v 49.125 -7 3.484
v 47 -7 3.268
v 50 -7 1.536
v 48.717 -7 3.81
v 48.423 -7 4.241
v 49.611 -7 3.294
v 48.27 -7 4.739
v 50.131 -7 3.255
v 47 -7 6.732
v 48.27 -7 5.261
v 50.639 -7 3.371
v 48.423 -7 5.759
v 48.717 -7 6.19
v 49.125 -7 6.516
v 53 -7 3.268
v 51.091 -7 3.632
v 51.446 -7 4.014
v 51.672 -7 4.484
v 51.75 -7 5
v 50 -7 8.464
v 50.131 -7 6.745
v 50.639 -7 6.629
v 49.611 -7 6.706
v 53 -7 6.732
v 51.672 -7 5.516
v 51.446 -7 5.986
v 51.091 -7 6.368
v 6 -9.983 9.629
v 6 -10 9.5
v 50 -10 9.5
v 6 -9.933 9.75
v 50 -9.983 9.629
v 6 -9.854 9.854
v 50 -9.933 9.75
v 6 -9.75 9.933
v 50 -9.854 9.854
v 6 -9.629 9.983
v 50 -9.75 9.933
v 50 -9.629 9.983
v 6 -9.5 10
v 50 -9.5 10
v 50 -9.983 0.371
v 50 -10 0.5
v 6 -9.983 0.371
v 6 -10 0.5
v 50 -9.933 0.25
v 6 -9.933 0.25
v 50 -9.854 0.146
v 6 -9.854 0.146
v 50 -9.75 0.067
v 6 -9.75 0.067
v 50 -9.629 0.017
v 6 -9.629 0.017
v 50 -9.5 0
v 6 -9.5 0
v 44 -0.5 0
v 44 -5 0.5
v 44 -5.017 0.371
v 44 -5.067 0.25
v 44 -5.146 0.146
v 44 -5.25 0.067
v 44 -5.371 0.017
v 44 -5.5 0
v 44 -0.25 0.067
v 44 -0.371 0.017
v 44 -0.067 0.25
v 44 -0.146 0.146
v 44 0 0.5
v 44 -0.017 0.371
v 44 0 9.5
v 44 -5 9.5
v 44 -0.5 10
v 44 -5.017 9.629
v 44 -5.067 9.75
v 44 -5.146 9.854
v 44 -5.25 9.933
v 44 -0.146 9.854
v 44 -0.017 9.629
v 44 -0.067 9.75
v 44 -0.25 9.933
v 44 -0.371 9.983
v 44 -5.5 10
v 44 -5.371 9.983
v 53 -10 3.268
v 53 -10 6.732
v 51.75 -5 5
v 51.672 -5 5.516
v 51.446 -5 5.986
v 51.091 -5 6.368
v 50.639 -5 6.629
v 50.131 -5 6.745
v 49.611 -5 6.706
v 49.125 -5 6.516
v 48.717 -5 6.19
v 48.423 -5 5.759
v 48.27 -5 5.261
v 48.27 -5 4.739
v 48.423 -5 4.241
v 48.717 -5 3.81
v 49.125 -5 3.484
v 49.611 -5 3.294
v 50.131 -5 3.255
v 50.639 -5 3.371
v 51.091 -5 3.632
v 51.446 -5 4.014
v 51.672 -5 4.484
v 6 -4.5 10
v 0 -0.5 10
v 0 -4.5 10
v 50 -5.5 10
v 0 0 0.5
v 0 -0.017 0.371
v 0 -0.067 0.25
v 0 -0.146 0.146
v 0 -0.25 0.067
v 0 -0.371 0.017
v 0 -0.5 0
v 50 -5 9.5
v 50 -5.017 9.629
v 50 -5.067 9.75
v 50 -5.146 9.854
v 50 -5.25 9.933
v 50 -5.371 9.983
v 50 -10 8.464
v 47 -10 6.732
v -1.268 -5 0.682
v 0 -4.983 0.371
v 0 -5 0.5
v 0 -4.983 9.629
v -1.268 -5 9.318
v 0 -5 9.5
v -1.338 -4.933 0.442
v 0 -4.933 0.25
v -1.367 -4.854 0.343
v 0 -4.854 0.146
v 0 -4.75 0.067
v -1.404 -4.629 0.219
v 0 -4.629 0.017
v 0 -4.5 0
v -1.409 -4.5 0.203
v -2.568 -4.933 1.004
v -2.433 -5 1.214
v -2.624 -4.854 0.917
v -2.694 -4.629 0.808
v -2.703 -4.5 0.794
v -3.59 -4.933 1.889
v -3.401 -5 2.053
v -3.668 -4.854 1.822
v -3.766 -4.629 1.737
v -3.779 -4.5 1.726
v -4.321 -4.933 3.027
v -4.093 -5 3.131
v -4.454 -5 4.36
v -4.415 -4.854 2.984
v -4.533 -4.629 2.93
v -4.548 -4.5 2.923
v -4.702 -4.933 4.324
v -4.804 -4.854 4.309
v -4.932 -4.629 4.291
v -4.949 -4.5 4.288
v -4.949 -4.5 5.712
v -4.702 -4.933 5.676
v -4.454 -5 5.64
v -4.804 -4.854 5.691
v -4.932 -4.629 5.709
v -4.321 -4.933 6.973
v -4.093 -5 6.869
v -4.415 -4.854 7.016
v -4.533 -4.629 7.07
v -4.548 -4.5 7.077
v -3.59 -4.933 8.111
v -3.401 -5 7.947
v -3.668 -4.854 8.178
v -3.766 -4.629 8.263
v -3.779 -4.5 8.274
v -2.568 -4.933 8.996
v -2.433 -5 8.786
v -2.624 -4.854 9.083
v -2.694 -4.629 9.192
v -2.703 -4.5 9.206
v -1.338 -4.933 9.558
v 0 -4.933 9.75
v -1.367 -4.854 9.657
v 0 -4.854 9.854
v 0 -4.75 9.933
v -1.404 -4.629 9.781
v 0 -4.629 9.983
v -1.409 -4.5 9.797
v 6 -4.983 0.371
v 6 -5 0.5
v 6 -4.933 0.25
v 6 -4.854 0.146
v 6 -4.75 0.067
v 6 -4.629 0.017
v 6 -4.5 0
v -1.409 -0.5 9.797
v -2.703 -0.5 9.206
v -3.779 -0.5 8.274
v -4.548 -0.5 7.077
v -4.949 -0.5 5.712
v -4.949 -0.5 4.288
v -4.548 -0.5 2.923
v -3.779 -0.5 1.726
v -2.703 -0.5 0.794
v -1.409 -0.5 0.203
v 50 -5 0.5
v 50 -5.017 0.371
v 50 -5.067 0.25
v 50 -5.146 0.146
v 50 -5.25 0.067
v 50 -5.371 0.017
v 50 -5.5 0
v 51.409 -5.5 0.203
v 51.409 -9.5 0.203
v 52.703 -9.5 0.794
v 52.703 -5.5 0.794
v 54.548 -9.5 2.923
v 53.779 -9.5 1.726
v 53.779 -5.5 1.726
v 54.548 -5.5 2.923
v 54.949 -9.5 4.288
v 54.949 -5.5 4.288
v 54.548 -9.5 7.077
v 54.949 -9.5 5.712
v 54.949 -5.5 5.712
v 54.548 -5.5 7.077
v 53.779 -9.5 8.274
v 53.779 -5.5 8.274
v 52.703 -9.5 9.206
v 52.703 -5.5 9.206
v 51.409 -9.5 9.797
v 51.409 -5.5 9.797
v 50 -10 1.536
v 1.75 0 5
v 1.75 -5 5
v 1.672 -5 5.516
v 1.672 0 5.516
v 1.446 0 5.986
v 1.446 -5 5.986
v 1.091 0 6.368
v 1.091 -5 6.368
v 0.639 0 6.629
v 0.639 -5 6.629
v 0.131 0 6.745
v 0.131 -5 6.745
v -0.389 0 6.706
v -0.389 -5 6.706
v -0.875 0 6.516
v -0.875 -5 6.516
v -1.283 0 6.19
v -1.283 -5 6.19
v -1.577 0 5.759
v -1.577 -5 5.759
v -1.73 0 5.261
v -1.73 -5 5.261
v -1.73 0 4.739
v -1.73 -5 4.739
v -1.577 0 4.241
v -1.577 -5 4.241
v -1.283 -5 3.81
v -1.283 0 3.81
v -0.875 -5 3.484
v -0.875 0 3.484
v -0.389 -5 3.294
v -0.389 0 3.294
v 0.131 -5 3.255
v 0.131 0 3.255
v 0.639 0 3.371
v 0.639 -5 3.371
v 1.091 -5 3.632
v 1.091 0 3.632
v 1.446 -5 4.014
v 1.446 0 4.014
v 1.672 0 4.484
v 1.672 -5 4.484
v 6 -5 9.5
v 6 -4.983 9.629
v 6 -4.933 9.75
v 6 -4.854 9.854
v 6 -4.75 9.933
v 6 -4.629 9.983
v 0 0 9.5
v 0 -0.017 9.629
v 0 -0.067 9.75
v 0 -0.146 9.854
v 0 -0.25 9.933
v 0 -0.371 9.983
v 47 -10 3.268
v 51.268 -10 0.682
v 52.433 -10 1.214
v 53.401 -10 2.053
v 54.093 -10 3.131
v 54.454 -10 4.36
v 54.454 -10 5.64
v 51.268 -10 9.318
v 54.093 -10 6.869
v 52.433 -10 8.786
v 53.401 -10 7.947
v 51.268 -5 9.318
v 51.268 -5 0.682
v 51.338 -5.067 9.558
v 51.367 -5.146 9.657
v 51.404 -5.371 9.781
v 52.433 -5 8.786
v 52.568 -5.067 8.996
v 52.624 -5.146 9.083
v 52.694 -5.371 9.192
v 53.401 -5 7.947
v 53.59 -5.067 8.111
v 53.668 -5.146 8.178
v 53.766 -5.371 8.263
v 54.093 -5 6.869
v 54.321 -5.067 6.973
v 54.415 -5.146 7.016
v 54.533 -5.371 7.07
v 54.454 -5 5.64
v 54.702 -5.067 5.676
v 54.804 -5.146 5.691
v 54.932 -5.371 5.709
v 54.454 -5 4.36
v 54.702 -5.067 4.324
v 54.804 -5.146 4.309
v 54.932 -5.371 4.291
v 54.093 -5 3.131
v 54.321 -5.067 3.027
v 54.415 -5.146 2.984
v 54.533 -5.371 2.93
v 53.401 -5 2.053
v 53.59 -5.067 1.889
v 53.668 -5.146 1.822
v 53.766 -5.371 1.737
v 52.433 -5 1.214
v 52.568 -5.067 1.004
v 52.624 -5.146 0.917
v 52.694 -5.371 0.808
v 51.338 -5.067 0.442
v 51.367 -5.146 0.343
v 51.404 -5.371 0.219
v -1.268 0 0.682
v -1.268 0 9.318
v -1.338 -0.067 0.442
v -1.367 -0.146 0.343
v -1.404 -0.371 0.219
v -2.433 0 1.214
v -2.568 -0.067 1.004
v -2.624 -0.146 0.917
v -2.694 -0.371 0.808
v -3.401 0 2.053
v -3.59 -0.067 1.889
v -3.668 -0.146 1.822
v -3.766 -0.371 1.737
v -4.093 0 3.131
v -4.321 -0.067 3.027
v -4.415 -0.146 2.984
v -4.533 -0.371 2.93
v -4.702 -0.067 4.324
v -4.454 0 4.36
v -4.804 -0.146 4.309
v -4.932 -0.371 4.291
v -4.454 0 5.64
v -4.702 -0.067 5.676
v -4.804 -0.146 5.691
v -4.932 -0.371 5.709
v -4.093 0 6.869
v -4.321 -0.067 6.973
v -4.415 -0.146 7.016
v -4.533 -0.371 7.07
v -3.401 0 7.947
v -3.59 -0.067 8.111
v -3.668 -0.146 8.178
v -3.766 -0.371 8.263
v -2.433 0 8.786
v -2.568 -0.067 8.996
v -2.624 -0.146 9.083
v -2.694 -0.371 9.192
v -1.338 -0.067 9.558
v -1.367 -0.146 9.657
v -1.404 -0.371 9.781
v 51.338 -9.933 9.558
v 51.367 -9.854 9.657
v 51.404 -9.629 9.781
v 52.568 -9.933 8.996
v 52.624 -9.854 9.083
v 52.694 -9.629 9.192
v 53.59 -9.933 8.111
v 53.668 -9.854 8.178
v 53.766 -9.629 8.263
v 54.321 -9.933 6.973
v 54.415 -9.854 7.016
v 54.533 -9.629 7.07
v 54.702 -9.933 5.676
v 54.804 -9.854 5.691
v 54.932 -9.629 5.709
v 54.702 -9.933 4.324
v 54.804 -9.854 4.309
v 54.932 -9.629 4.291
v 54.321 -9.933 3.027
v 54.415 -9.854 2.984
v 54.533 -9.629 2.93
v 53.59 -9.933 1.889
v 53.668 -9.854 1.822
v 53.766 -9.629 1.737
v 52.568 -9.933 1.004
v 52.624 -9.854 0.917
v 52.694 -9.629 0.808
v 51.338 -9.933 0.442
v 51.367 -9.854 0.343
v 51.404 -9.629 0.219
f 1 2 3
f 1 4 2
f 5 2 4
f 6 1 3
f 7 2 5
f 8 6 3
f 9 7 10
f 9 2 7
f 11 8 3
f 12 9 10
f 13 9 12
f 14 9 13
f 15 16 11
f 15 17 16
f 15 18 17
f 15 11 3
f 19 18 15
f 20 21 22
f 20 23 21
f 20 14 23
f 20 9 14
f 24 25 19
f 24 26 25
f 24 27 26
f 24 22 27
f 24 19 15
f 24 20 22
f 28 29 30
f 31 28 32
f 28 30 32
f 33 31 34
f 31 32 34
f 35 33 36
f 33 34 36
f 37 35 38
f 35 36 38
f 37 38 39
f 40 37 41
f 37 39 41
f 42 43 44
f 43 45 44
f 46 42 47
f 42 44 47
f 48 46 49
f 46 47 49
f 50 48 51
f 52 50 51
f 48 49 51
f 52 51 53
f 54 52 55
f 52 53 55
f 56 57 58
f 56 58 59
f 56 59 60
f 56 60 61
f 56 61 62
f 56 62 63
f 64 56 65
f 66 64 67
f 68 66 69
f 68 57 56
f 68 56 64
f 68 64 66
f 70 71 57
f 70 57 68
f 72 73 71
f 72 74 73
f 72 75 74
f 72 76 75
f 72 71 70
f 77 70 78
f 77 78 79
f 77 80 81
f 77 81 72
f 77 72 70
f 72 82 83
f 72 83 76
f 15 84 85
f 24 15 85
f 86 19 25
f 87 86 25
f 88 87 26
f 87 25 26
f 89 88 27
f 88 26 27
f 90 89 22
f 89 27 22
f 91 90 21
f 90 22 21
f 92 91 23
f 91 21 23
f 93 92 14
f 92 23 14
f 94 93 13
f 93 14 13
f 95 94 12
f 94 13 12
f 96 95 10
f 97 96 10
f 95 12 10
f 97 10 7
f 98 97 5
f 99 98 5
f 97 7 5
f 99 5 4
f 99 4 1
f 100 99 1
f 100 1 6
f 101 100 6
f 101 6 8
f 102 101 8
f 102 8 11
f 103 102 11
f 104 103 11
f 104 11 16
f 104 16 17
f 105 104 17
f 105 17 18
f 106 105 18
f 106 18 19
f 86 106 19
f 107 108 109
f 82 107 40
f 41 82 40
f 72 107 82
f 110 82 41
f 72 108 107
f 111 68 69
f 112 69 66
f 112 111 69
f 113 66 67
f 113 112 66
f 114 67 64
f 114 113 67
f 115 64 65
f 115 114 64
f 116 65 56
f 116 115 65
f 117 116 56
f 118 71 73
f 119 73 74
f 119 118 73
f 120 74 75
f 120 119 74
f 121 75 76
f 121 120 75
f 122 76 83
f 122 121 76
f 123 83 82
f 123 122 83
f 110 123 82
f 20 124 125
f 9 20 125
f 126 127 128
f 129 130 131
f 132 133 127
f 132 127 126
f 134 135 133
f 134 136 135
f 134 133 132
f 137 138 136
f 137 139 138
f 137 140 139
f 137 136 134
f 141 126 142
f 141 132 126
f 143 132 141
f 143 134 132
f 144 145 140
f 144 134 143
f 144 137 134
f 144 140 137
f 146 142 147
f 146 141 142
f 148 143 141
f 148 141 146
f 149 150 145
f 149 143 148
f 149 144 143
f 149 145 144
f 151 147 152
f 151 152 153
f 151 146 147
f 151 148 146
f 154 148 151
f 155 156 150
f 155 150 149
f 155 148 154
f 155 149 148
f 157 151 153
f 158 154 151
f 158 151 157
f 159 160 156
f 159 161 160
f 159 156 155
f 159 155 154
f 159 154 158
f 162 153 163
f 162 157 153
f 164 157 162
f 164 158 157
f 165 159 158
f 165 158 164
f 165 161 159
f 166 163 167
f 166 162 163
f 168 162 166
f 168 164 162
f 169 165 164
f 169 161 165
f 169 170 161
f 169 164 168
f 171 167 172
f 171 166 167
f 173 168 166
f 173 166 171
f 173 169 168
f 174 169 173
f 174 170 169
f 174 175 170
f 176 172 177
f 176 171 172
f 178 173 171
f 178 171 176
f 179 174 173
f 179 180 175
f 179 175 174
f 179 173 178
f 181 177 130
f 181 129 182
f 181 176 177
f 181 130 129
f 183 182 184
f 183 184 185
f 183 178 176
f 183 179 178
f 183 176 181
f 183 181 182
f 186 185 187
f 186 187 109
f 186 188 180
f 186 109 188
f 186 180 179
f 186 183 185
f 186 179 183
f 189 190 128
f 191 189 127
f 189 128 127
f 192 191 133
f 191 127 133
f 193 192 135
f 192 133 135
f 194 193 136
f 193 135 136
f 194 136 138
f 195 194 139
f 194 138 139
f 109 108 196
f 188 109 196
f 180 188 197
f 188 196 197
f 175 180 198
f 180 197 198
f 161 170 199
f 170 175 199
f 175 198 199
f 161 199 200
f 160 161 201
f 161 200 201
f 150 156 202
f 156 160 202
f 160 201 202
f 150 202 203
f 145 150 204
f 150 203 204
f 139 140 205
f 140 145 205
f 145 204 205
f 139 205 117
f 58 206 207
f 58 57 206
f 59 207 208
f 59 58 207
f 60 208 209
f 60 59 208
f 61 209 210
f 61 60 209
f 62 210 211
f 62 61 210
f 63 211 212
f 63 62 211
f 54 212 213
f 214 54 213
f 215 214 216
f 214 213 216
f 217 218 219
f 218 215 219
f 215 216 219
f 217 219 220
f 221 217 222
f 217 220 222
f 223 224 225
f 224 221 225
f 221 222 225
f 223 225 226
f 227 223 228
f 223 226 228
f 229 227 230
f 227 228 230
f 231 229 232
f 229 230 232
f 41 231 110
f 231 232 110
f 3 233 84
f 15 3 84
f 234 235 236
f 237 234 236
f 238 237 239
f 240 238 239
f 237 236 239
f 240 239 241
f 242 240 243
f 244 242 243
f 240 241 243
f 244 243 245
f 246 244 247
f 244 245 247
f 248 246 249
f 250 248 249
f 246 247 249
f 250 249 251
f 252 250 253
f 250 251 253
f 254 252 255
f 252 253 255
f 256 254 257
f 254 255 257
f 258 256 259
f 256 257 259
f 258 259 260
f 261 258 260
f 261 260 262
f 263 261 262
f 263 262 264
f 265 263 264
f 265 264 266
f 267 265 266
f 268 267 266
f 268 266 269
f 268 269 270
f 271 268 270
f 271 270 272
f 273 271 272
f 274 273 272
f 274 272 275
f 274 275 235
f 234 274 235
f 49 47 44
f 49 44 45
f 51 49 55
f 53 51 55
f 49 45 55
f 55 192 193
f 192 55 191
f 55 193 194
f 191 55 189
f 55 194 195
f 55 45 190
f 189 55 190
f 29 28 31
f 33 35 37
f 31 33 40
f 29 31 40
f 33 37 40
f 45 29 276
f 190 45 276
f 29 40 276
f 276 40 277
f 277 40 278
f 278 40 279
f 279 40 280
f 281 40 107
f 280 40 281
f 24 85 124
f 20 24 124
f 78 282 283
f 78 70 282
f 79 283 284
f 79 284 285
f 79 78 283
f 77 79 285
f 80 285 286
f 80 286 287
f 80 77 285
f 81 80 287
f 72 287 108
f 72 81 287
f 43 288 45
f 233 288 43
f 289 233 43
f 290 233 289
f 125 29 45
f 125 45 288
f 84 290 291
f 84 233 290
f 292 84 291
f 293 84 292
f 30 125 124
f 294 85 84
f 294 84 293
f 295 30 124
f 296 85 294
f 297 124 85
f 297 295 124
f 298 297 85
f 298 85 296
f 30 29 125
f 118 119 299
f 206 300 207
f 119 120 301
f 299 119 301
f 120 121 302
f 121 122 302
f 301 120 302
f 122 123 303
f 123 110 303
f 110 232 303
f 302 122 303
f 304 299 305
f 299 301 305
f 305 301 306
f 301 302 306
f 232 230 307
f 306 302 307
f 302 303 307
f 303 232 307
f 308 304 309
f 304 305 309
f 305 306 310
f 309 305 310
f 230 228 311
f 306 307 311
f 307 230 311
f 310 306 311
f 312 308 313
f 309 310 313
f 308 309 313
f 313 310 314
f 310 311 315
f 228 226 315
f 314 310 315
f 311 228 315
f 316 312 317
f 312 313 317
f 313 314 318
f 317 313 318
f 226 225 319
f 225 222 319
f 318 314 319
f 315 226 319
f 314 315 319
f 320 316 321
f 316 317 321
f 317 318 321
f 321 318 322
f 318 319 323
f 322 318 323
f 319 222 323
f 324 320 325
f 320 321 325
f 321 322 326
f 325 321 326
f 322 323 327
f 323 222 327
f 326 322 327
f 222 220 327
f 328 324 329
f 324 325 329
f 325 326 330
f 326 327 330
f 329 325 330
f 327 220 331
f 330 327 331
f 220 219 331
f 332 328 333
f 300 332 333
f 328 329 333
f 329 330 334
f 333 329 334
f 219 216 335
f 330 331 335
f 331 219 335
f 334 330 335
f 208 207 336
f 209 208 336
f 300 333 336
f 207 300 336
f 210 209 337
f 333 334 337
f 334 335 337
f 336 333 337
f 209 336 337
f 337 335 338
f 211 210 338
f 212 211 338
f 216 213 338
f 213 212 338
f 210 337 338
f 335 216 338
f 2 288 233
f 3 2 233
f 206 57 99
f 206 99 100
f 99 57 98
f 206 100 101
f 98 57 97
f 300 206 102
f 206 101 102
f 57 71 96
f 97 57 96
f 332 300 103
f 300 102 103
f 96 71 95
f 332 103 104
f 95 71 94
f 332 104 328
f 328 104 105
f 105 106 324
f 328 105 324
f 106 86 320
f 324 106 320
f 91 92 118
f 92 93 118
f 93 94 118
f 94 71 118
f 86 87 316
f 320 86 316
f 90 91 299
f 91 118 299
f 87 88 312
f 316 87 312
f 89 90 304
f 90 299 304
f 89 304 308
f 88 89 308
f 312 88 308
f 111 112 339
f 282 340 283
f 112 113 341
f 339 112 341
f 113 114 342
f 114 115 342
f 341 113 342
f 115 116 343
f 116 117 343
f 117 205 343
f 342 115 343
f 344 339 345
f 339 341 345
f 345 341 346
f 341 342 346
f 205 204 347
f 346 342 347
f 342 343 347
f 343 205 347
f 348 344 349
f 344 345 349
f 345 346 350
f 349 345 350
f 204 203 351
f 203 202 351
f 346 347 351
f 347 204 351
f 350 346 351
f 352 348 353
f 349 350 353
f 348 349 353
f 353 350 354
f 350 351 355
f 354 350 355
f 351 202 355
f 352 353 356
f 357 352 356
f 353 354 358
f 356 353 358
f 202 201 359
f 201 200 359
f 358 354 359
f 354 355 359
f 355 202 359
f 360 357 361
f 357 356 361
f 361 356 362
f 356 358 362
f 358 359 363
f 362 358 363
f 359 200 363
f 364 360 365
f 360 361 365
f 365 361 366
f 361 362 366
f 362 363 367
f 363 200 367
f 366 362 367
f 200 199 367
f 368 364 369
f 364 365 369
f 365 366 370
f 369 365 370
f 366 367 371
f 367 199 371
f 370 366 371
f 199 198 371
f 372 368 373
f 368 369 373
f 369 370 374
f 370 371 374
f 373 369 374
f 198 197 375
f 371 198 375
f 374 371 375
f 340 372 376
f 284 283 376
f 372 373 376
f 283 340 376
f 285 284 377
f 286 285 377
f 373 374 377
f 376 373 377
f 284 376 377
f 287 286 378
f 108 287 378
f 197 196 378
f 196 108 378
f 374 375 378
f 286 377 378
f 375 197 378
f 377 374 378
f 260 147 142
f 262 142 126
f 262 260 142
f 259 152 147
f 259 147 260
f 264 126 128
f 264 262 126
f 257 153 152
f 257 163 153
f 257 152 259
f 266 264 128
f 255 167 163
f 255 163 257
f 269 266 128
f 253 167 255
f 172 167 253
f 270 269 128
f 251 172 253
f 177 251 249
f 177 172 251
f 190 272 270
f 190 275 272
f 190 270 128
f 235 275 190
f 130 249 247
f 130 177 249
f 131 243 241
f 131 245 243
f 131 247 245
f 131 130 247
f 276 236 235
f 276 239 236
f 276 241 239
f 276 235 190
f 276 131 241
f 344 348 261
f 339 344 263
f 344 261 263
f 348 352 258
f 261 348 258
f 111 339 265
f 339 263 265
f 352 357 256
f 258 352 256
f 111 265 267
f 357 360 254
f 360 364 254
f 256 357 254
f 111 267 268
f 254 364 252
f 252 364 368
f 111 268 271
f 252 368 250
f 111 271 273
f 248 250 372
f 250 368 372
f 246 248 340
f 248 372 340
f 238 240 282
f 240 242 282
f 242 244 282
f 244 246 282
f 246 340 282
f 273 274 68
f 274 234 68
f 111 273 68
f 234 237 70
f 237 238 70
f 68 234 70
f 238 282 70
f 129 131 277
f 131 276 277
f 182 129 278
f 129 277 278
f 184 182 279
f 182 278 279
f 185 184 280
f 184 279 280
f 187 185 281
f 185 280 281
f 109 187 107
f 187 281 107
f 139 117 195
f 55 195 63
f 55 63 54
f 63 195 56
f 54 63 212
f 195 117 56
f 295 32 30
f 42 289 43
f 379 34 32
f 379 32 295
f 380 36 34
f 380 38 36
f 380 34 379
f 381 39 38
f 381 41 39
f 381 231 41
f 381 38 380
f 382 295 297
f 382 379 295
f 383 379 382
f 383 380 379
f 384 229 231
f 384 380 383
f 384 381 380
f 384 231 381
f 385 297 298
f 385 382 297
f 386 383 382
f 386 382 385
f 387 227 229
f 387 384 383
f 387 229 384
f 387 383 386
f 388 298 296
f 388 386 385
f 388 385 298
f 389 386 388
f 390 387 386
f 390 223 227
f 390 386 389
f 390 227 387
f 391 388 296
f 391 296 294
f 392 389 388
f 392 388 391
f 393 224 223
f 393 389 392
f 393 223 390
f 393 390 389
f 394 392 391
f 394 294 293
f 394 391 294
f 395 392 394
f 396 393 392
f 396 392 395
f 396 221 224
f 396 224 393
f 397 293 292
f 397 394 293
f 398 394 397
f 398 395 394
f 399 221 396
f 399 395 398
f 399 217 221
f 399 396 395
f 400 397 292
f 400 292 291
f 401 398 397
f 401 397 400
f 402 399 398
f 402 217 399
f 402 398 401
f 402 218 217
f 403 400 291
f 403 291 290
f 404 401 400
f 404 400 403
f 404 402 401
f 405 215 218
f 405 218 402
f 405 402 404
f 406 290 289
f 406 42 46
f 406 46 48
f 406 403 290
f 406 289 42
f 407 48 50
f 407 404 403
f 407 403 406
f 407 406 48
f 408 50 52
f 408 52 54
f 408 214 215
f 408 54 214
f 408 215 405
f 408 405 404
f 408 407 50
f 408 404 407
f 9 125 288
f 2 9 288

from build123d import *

# Parameters (mm, degrees)
F0_W     = 50
F0_H     = 10
F1_DEPTH = 10
F2_W     = 13.4624946701
F2_H     = 5
F2_W_2   = 13.2752915323
F3_DEPTH = 25
F4_R     = 1.75
F5_DEPTH = 25
F7_DEPTH = 3
F8_R     = 0.5


# Not quite as in the source:
# - a feature names something its author has since deleted; it is built from what else it names


with BuildPart() as f1:
    # F0 (on Front) → F1 (new body)
    with BuildSketch(Plane.XZ):
        with Locations((25, 5)):
            Rectangle(F0_W, F0_H)
        with BuildLine():
            ThreePointArc((0, 10), (-5, 5), (0, 0))
            Line((0, 0), (0, 10))
        make_face()
        with BuildLine():
            Line((50, 10), (50, 0))
            ThreePointArc((50, 0), (55, 5), (50, 10))
        make_face()
    extrude(amount=F1_DEPTH)

    # F2 (on face) → F3 (cut)
    with BuildSketch(Plane.XY.offset(10)):
        with Locations((-0.7312473351, -7.5)):
            Rectangle(F2_W, F2_H)
        with Locations((50.6376457661, -2.5)):
            Rectangle(F2_W_2, F2_H)
    extrude(amount=-F3_DEPTH, mode=Mode.SUBTRACT)

    # F4 (on face) → F5 (cut)
    with BuildSketch(Plane.XZ.offset(10)):
        with Locations((50, 5)):
            Circle(F4_R)
        with Locations((0, 5)):
            Circle(F4_R)
    extrude(amount=-F5_DEPTH, mode=Mode.SUBTRACT)

    # F6 (on face) → F7 (cut)
    with BuildSketch(Plane.XZ.offset(10)):
        Polygon((53, 3.2679491924), (53, 6.7320508076), (50, 8.4641016151), (47, 6.7320508076), (47, 3.2679491924), (50, 1.5358983849), align=None)
    extrude(amount=-F7_DEPTH, mode=Mode.SUBTRACT)

    # F8
    f8_edges = [f1.edges().sort_by_distance(p)[0] for p in [
        (28, -10, 10),
        (22, 0, 10),
        (-5, -5, 5),
        (55, -5, 5),
        (22, 0, 0),
        (47, -5, 0),
        (28, -10, 0),
        (3, -5, 0),
        (-5, 0, 5),
        (47, -5, 10),
        (55, -10, 5),
        (3, -5, 10),
    ]]
    fillet(f8_edges, radius=F8_R)


solid = f1.part
